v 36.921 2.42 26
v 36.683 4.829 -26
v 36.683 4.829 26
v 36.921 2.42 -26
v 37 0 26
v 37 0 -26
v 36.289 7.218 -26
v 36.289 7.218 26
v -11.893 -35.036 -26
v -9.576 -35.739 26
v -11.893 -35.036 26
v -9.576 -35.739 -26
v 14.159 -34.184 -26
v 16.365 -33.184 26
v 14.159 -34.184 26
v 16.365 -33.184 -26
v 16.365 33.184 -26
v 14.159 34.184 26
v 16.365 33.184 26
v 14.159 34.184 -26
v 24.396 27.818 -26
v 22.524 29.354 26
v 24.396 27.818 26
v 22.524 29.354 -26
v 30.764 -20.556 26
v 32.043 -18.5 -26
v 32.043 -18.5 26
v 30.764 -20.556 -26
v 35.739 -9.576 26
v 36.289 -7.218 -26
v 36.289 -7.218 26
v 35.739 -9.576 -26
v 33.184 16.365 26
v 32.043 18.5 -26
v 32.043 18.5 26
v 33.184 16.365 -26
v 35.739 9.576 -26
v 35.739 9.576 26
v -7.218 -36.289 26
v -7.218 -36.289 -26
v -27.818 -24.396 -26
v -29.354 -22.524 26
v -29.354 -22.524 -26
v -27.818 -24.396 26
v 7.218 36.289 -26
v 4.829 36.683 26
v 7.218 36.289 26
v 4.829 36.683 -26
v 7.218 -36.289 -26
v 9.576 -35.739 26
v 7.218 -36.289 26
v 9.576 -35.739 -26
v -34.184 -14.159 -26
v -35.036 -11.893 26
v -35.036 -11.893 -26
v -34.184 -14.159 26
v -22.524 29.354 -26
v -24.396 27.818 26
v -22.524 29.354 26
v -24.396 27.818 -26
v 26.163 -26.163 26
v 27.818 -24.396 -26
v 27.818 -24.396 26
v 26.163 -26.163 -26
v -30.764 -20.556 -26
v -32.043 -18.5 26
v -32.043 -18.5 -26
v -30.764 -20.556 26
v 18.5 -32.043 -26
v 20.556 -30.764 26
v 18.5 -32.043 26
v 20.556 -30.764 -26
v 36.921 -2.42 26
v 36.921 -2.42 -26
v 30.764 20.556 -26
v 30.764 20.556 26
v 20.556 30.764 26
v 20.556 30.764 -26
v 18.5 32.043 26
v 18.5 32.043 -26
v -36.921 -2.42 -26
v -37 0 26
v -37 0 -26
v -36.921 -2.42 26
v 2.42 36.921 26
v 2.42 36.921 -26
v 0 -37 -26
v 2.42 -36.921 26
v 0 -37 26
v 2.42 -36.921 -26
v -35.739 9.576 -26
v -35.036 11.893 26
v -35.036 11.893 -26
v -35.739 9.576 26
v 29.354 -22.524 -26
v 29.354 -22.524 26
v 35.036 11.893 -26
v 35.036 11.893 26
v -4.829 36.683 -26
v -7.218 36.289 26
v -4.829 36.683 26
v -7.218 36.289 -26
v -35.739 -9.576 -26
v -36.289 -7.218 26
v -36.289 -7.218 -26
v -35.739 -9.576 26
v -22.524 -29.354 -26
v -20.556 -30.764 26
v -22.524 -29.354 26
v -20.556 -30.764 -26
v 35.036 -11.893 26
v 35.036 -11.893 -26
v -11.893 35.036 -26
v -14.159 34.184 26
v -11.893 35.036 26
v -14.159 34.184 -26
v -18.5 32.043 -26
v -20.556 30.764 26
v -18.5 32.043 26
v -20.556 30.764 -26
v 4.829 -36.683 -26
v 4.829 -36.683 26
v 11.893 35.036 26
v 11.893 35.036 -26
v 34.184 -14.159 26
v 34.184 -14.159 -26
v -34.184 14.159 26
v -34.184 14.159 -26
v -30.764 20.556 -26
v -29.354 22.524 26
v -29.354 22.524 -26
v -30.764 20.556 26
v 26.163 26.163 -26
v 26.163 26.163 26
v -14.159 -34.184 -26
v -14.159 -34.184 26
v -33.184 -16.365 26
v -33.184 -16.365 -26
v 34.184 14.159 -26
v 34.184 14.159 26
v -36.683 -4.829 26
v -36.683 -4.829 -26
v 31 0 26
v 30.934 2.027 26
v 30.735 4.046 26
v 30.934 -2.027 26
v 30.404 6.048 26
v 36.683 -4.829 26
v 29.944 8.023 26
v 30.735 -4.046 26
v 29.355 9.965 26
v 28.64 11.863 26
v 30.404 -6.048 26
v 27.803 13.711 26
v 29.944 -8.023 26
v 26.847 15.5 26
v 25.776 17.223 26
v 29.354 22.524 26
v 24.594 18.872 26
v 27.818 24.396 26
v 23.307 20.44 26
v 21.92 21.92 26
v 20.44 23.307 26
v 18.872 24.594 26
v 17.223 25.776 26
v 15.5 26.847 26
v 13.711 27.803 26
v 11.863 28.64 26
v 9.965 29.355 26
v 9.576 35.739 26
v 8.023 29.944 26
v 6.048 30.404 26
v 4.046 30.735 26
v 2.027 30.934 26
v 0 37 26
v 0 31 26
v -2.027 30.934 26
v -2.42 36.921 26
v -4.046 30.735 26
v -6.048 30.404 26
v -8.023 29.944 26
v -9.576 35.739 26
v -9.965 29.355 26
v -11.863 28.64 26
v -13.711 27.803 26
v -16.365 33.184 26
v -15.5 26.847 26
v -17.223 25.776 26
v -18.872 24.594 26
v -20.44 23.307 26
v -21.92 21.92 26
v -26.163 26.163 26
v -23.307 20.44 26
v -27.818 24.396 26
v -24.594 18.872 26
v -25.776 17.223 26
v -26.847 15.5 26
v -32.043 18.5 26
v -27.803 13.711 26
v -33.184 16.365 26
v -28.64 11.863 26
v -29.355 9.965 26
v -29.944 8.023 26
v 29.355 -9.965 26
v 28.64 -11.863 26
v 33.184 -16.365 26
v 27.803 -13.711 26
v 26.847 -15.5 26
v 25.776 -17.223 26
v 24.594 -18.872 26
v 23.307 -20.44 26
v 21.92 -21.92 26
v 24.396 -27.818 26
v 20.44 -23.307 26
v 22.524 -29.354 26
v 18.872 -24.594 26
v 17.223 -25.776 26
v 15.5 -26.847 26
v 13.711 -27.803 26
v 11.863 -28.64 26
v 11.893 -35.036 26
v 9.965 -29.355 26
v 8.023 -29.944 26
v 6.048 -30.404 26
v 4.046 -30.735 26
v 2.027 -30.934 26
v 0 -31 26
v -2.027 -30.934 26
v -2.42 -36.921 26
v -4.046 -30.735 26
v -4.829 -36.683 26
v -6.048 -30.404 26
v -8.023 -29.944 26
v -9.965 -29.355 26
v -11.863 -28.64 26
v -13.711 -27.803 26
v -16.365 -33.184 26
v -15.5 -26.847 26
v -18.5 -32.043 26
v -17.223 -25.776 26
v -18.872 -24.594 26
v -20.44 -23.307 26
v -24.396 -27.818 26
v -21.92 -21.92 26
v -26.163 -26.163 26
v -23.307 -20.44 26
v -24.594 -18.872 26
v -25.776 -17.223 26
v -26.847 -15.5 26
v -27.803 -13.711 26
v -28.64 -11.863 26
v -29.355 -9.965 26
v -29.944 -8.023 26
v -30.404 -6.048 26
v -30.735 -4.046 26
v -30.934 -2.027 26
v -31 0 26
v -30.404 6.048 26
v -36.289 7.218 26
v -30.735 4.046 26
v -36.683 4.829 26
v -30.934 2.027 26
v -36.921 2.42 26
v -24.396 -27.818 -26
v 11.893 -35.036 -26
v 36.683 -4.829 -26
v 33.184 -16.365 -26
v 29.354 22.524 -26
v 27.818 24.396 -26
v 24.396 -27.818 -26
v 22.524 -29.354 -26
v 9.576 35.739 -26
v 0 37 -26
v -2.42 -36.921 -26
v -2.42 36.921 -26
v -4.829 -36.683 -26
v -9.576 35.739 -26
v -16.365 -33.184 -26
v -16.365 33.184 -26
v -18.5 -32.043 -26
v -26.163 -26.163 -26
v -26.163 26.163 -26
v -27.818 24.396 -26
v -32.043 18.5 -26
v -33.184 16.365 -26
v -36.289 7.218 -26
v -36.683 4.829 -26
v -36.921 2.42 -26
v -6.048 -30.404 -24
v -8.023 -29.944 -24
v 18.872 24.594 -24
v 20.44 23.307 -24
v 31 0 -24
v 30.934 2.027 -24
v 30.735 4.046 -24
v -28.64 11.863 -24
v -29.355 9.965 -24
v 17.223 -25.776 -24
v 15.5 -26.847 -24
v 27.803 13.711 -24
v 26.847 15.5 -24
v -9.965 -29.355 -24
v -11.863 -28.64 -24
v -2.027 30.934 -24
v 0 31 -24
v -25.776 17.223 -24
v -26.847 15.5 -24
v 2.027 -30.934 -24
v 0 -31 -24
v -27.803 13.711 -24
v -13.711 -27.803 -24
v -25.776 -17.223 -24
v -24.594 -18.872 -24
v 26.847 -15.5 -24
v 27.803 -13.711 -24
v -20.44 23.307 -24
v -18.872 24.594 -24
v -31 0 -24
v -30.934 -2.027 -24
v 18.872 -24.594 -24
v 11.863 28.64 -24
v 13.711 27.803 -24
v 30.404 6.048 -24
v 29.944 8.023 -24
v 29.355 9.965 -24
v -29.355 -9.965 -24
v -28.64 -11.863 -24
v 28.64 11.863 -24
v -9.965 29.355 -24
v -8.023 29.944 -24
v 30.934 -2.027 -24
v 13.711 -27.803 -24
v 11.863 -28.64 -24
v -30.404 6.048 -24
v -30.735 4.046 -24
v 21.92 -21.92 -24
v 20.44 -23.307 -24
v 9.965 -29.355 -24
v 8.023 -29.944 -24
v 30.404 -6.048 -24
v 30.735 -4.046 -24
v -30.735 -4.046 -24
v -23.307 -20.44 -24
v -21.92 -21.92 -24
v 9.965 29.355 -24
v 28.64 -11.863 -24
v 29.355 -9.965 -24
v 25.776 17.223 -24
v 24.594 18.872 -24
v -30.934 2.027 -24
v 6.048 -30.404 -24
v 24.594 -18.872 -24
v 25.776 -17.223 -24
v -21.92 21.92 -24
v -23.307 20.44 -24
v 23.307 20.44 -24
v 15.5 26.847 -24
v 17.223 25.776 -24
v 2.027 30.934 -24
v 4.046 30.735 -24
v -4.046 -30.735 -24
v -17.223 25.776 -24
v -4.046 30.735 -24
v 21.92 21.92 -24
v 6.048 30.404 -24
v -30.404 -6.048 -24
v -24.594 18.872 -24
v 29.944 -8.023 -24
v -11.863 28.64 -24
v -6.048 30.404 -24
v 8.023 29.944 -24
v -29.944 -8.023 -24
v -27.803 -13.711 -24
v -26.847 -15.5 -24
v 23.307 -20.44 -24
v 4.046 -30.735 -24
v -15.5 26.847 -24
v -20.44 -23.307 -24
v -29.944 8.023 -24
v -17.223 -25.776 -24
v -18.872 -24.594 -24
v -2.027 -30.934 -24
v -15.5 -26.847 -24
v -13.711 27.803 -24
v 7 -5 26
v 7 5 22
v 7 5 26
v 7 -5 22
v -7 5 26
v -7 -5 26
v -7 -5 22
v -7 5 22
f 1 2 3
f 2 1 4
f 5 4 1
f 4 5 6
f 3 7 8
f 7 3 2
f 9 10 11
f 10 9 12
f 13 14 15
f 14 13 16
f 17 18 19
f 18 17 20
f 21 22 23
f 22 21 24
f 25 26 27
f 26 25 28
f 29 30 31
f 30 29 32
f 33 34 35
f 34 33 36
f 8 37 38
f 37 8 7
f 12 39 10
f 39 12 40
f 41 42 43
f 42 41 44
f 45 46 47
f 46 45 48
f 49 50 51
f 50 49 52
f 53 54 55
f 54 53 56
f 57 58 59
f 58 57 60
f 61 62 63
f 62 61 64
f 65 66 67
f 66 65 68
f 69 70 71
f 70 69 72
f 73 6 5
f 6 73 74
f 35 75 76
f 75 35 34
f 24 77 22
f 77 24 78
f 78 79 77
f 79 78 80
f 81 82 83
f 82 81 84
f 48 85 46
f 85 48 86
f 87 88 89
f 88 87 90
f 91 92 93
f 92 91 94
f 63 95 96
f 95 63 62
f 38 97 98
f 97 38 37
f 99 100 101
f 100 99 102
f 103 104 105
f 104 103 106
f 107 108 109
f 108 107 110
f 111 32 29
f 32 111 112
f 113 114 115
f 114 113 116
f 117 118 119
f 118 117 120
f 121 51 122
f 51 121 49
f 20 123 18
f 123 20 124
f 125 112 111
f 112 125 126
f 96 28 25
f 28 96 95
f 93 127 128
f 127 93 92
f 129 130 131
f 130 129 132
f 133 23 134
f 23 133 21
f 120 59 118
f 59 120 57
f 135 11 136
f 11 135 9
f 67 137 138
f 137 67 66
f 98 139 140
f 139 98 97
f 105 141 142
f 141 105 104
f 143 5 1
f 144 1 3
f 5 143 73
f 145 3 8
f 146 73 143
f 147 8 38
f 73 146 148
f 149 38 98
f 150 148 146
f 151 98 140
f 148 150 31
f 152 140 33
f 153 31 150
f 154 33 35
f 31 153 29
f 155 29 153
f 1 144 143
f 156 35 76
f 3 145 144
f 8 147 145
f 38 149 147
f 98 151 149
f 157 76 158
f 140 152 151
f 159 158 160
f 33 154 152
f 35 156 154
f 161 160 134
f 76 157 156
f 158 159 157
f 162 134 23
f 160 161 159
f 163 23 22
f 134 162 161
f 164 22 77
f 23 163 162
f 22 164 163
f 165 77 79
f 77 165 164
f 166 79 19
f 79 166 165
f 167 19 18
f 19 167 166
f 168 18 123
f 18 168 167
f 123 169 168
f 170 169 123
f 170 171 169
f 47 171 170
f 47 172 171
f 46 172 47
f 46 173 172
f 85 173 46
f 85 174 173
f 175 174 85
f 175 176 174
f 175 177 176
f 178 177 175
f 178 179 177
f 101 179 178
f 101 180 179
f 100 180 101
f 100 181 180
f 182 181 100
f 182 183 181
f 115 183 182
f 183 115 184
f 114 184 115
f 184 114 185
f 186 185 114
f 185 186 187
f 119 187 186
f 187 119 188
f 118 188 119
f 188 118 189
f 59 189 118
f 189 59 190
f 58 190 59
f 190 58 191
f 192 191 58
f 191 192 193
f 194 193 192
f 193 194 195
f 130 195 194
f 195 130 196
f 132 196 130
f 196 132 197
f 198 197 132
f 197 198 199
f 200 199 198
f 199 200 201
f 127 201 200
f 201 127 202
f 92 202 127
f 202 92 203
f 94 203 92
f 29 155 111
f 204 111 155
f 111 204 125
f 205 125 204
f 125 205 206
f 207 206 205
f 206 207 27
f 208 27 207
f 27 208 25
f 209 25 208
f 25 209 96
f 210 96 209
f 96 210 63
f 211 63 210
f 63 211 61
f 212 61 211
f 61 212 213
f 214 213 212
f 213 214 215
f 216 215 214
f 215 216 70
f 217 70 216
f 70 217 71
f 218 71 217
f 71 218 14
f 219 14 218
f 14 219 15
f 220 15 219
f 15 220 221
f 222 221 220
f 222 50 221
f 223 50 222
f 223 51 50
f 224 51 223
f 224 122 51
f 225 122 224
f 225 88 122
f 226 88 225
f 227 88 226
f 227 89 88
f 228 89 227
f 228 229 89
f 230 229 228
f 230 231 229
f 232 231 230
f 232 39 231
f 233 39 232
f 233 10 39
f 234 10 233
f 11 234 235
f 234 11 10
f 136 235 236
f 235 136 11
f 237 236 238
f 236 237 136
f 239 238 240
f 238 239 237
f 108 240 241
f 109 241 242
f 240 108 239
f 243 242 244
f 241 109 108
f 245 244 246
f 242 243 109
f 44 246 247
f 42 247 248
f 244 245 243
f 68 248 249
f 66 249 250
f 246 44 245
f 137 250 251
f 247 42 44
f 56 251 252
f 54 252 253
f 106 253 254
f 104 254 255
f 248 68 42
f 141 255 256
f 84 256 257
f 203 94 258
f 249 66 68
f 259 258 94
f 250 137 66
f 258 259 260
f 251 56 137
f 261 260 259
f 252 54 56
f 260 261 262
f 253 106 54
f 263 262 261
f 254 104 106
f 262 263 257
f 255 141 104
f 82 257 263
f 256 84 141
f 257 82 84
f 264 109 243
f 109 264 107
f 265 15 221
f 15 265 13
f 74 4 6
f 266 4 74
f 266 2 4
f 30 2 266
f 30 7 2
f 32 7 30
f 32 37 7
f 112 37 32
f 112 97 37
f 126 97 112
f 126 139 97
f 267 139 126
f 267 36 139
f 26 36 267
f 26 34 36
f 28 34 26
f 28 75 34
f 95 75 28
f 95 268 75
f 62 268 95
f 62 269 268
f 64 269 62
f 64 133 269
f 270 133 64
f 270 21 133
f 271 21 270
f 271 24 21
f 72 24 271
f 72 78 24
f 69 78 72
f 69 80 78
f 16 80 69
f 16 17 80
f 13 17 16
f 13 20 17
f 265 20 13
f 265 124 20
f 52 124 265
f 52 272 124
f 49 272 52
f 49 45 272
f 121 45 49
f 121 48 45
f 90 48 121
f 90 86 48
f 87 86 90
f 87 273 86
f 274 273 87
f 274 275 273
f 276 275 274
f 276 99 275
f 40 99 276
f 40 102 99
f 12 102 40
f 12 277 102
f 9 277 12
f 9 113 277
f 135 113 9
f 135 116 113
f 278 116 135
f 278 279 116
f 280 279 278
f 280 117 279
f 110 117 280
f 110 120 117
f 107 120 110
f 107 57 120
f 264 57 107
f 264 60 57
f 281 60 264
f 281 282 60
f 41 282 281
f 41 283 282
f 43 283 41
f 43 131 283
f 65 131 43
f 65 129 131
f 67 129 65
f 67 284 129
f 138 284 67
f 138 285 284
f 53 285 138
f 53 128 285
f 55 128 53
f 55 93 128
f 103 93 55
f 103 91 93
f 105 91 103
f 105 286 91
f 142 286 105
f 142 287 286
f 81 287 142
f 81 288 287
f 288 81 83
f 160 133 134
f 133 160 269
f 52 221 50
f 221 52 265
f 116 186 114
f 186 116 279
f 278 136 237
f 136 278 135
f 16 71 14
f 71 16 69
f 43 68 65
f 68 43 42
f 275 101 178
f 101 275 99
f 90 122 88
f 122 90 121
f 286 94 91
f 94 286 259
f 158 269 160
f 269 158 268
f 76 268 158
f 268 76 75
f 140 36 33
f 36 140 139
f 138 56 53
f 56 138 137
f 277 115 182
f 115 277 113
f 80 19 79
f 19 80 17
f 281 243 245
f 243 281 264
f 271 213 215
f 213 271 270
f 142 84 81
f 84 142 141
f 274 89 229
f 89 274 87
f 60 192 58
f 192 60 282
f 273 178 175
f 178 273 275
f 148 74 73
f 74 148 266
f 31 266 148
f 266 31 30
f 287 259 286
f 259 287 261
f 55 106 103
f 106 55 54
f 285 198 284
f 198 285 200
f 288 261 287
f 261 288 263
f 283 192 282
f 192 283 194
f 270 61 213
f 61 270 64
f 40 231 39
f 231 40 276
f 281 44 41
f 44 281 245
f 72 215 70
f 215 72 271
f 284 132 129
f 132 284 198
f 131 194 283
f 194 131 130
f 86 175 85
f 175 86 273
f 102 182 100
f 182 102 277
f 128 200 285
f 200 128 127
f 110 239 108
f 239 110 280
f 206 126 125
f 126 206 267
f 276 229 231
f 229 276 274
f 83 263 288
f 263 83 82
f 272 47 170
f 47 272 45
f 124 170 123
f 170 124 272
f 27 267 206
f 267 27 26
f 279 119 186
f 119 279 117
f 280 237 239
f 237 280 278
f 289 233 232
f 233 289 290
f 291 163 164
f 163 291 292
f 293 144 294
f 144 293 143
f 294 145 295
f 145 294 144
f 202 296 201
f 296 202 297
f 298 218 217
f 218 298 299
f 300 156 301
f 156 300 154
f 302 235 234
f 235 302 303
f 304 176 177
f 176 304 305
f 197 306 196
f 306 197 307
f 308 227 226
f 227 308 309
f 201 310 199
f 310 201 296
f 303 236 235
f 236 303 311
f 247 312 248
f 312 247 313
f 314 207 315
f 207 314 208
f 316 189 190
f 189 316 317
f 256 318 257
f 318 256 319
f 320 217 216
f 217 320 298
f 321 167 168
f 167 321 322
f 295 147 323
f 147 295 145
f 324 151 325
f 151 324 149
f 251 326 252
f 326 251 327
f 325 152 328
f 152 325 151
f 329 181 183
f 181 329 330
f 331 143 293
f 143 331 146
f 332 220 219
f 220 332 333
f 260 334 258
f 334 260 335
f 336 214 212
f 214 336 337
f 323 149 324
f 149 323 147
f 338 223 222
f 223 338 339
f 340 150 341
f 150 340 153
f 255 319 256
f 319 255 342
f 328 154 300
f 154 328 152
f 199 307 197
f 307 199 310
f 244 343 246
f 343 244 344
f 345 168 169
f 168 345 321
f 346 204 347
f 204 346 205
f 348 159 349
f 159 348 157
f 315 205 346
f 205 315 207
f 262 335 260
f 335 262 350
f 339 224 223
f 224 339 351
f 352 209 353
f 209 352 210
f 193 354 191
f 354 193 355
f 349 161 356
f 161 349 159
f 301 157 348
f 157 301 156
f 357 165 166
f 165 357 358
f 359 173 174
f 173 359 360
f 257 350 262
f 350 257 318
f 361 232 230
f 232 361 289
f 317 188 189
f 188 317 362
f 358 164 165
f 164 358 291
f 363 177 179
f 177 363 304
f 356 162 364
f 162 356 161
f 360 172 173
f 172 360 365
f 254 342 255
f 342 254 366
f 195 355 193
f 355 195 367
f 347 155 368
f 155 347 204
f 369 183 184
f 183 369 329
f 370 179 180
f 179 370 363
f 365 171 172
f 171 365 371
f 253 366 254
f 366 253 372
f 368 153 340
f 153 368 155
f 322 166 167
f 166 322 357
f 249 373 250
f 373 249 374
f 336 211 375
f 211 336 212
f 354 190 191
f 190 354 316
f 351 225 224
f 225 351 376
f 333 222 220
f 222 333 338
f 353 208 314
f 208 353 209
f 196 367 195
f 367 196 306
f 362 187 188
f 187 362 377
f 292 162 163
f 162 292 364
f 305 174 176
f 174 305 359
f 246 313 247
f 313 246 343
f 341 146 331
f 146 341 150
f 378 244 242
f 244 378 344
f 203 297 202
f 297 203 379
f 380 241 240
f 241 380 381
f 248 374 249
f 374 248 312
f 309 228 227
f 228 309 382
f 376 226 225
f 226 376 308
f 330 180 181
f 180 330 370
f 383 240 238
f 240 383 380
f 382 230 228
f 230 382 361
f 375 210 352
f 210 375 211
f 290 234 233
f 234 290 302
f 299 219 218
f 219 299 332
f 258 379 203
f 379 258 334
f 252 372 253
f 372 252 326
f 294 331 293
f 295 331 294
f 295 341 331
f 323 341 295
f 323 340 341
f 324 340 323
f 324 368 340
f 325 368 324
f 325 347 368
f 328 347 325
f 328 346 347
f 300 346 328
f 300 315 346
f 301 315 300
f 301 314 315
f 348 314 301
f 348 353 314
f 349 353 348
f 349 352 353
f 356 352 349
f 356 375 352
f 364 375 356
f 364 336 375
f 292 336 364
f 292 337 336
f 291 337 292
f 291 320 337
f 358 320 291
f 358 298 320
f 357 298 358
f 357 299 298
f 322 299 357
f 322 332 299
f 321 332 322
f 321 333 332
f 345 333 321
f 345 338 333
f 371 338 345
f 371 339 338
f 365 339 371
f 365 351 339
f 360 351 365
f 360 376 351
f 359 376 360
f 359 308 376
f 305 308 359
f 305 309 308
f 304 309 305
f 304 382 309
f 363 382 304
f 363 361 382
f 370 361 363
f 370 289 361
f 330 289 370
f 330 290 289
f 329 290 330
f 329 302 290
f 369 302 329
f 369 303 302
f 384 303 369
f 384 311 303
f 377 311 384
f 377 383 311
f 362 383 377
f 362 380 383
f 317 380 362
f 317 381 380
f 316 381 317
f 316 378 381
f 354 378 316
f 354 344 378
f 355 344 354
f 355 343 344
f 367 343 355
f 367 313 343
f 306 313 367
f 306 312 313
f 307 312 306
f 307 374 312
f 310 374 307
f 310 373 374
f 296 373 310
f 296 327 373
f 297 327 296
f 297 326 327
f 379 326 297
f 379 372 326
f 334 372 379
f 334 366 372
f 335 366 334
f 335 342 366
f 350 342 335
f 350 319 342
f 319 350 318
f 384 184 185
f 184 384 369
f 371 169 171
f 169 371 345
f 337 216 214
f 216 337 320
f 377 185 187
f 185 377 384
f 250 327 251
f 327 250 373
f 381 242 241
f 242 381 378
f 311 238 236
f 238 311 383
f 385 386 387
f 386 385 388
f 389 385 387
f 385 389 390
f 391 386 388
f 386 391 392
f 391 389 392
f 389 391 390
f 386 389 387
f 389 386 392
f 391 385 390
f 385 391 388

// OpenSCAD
// Whirl rotor chamber
$fn = 96;

chamber_outer = 74;
chamber_height = 52;

difference() {
    cylinder(h = chamber_height, d = chamber_outer, center = true);
    translate([0, 0, 2])
        cylinder(h = chamber_height, d = 62, center = true);
}
translate([0, 0, chamber_height / 2 - 2])
    cube([14, 10, 4], center = true);
